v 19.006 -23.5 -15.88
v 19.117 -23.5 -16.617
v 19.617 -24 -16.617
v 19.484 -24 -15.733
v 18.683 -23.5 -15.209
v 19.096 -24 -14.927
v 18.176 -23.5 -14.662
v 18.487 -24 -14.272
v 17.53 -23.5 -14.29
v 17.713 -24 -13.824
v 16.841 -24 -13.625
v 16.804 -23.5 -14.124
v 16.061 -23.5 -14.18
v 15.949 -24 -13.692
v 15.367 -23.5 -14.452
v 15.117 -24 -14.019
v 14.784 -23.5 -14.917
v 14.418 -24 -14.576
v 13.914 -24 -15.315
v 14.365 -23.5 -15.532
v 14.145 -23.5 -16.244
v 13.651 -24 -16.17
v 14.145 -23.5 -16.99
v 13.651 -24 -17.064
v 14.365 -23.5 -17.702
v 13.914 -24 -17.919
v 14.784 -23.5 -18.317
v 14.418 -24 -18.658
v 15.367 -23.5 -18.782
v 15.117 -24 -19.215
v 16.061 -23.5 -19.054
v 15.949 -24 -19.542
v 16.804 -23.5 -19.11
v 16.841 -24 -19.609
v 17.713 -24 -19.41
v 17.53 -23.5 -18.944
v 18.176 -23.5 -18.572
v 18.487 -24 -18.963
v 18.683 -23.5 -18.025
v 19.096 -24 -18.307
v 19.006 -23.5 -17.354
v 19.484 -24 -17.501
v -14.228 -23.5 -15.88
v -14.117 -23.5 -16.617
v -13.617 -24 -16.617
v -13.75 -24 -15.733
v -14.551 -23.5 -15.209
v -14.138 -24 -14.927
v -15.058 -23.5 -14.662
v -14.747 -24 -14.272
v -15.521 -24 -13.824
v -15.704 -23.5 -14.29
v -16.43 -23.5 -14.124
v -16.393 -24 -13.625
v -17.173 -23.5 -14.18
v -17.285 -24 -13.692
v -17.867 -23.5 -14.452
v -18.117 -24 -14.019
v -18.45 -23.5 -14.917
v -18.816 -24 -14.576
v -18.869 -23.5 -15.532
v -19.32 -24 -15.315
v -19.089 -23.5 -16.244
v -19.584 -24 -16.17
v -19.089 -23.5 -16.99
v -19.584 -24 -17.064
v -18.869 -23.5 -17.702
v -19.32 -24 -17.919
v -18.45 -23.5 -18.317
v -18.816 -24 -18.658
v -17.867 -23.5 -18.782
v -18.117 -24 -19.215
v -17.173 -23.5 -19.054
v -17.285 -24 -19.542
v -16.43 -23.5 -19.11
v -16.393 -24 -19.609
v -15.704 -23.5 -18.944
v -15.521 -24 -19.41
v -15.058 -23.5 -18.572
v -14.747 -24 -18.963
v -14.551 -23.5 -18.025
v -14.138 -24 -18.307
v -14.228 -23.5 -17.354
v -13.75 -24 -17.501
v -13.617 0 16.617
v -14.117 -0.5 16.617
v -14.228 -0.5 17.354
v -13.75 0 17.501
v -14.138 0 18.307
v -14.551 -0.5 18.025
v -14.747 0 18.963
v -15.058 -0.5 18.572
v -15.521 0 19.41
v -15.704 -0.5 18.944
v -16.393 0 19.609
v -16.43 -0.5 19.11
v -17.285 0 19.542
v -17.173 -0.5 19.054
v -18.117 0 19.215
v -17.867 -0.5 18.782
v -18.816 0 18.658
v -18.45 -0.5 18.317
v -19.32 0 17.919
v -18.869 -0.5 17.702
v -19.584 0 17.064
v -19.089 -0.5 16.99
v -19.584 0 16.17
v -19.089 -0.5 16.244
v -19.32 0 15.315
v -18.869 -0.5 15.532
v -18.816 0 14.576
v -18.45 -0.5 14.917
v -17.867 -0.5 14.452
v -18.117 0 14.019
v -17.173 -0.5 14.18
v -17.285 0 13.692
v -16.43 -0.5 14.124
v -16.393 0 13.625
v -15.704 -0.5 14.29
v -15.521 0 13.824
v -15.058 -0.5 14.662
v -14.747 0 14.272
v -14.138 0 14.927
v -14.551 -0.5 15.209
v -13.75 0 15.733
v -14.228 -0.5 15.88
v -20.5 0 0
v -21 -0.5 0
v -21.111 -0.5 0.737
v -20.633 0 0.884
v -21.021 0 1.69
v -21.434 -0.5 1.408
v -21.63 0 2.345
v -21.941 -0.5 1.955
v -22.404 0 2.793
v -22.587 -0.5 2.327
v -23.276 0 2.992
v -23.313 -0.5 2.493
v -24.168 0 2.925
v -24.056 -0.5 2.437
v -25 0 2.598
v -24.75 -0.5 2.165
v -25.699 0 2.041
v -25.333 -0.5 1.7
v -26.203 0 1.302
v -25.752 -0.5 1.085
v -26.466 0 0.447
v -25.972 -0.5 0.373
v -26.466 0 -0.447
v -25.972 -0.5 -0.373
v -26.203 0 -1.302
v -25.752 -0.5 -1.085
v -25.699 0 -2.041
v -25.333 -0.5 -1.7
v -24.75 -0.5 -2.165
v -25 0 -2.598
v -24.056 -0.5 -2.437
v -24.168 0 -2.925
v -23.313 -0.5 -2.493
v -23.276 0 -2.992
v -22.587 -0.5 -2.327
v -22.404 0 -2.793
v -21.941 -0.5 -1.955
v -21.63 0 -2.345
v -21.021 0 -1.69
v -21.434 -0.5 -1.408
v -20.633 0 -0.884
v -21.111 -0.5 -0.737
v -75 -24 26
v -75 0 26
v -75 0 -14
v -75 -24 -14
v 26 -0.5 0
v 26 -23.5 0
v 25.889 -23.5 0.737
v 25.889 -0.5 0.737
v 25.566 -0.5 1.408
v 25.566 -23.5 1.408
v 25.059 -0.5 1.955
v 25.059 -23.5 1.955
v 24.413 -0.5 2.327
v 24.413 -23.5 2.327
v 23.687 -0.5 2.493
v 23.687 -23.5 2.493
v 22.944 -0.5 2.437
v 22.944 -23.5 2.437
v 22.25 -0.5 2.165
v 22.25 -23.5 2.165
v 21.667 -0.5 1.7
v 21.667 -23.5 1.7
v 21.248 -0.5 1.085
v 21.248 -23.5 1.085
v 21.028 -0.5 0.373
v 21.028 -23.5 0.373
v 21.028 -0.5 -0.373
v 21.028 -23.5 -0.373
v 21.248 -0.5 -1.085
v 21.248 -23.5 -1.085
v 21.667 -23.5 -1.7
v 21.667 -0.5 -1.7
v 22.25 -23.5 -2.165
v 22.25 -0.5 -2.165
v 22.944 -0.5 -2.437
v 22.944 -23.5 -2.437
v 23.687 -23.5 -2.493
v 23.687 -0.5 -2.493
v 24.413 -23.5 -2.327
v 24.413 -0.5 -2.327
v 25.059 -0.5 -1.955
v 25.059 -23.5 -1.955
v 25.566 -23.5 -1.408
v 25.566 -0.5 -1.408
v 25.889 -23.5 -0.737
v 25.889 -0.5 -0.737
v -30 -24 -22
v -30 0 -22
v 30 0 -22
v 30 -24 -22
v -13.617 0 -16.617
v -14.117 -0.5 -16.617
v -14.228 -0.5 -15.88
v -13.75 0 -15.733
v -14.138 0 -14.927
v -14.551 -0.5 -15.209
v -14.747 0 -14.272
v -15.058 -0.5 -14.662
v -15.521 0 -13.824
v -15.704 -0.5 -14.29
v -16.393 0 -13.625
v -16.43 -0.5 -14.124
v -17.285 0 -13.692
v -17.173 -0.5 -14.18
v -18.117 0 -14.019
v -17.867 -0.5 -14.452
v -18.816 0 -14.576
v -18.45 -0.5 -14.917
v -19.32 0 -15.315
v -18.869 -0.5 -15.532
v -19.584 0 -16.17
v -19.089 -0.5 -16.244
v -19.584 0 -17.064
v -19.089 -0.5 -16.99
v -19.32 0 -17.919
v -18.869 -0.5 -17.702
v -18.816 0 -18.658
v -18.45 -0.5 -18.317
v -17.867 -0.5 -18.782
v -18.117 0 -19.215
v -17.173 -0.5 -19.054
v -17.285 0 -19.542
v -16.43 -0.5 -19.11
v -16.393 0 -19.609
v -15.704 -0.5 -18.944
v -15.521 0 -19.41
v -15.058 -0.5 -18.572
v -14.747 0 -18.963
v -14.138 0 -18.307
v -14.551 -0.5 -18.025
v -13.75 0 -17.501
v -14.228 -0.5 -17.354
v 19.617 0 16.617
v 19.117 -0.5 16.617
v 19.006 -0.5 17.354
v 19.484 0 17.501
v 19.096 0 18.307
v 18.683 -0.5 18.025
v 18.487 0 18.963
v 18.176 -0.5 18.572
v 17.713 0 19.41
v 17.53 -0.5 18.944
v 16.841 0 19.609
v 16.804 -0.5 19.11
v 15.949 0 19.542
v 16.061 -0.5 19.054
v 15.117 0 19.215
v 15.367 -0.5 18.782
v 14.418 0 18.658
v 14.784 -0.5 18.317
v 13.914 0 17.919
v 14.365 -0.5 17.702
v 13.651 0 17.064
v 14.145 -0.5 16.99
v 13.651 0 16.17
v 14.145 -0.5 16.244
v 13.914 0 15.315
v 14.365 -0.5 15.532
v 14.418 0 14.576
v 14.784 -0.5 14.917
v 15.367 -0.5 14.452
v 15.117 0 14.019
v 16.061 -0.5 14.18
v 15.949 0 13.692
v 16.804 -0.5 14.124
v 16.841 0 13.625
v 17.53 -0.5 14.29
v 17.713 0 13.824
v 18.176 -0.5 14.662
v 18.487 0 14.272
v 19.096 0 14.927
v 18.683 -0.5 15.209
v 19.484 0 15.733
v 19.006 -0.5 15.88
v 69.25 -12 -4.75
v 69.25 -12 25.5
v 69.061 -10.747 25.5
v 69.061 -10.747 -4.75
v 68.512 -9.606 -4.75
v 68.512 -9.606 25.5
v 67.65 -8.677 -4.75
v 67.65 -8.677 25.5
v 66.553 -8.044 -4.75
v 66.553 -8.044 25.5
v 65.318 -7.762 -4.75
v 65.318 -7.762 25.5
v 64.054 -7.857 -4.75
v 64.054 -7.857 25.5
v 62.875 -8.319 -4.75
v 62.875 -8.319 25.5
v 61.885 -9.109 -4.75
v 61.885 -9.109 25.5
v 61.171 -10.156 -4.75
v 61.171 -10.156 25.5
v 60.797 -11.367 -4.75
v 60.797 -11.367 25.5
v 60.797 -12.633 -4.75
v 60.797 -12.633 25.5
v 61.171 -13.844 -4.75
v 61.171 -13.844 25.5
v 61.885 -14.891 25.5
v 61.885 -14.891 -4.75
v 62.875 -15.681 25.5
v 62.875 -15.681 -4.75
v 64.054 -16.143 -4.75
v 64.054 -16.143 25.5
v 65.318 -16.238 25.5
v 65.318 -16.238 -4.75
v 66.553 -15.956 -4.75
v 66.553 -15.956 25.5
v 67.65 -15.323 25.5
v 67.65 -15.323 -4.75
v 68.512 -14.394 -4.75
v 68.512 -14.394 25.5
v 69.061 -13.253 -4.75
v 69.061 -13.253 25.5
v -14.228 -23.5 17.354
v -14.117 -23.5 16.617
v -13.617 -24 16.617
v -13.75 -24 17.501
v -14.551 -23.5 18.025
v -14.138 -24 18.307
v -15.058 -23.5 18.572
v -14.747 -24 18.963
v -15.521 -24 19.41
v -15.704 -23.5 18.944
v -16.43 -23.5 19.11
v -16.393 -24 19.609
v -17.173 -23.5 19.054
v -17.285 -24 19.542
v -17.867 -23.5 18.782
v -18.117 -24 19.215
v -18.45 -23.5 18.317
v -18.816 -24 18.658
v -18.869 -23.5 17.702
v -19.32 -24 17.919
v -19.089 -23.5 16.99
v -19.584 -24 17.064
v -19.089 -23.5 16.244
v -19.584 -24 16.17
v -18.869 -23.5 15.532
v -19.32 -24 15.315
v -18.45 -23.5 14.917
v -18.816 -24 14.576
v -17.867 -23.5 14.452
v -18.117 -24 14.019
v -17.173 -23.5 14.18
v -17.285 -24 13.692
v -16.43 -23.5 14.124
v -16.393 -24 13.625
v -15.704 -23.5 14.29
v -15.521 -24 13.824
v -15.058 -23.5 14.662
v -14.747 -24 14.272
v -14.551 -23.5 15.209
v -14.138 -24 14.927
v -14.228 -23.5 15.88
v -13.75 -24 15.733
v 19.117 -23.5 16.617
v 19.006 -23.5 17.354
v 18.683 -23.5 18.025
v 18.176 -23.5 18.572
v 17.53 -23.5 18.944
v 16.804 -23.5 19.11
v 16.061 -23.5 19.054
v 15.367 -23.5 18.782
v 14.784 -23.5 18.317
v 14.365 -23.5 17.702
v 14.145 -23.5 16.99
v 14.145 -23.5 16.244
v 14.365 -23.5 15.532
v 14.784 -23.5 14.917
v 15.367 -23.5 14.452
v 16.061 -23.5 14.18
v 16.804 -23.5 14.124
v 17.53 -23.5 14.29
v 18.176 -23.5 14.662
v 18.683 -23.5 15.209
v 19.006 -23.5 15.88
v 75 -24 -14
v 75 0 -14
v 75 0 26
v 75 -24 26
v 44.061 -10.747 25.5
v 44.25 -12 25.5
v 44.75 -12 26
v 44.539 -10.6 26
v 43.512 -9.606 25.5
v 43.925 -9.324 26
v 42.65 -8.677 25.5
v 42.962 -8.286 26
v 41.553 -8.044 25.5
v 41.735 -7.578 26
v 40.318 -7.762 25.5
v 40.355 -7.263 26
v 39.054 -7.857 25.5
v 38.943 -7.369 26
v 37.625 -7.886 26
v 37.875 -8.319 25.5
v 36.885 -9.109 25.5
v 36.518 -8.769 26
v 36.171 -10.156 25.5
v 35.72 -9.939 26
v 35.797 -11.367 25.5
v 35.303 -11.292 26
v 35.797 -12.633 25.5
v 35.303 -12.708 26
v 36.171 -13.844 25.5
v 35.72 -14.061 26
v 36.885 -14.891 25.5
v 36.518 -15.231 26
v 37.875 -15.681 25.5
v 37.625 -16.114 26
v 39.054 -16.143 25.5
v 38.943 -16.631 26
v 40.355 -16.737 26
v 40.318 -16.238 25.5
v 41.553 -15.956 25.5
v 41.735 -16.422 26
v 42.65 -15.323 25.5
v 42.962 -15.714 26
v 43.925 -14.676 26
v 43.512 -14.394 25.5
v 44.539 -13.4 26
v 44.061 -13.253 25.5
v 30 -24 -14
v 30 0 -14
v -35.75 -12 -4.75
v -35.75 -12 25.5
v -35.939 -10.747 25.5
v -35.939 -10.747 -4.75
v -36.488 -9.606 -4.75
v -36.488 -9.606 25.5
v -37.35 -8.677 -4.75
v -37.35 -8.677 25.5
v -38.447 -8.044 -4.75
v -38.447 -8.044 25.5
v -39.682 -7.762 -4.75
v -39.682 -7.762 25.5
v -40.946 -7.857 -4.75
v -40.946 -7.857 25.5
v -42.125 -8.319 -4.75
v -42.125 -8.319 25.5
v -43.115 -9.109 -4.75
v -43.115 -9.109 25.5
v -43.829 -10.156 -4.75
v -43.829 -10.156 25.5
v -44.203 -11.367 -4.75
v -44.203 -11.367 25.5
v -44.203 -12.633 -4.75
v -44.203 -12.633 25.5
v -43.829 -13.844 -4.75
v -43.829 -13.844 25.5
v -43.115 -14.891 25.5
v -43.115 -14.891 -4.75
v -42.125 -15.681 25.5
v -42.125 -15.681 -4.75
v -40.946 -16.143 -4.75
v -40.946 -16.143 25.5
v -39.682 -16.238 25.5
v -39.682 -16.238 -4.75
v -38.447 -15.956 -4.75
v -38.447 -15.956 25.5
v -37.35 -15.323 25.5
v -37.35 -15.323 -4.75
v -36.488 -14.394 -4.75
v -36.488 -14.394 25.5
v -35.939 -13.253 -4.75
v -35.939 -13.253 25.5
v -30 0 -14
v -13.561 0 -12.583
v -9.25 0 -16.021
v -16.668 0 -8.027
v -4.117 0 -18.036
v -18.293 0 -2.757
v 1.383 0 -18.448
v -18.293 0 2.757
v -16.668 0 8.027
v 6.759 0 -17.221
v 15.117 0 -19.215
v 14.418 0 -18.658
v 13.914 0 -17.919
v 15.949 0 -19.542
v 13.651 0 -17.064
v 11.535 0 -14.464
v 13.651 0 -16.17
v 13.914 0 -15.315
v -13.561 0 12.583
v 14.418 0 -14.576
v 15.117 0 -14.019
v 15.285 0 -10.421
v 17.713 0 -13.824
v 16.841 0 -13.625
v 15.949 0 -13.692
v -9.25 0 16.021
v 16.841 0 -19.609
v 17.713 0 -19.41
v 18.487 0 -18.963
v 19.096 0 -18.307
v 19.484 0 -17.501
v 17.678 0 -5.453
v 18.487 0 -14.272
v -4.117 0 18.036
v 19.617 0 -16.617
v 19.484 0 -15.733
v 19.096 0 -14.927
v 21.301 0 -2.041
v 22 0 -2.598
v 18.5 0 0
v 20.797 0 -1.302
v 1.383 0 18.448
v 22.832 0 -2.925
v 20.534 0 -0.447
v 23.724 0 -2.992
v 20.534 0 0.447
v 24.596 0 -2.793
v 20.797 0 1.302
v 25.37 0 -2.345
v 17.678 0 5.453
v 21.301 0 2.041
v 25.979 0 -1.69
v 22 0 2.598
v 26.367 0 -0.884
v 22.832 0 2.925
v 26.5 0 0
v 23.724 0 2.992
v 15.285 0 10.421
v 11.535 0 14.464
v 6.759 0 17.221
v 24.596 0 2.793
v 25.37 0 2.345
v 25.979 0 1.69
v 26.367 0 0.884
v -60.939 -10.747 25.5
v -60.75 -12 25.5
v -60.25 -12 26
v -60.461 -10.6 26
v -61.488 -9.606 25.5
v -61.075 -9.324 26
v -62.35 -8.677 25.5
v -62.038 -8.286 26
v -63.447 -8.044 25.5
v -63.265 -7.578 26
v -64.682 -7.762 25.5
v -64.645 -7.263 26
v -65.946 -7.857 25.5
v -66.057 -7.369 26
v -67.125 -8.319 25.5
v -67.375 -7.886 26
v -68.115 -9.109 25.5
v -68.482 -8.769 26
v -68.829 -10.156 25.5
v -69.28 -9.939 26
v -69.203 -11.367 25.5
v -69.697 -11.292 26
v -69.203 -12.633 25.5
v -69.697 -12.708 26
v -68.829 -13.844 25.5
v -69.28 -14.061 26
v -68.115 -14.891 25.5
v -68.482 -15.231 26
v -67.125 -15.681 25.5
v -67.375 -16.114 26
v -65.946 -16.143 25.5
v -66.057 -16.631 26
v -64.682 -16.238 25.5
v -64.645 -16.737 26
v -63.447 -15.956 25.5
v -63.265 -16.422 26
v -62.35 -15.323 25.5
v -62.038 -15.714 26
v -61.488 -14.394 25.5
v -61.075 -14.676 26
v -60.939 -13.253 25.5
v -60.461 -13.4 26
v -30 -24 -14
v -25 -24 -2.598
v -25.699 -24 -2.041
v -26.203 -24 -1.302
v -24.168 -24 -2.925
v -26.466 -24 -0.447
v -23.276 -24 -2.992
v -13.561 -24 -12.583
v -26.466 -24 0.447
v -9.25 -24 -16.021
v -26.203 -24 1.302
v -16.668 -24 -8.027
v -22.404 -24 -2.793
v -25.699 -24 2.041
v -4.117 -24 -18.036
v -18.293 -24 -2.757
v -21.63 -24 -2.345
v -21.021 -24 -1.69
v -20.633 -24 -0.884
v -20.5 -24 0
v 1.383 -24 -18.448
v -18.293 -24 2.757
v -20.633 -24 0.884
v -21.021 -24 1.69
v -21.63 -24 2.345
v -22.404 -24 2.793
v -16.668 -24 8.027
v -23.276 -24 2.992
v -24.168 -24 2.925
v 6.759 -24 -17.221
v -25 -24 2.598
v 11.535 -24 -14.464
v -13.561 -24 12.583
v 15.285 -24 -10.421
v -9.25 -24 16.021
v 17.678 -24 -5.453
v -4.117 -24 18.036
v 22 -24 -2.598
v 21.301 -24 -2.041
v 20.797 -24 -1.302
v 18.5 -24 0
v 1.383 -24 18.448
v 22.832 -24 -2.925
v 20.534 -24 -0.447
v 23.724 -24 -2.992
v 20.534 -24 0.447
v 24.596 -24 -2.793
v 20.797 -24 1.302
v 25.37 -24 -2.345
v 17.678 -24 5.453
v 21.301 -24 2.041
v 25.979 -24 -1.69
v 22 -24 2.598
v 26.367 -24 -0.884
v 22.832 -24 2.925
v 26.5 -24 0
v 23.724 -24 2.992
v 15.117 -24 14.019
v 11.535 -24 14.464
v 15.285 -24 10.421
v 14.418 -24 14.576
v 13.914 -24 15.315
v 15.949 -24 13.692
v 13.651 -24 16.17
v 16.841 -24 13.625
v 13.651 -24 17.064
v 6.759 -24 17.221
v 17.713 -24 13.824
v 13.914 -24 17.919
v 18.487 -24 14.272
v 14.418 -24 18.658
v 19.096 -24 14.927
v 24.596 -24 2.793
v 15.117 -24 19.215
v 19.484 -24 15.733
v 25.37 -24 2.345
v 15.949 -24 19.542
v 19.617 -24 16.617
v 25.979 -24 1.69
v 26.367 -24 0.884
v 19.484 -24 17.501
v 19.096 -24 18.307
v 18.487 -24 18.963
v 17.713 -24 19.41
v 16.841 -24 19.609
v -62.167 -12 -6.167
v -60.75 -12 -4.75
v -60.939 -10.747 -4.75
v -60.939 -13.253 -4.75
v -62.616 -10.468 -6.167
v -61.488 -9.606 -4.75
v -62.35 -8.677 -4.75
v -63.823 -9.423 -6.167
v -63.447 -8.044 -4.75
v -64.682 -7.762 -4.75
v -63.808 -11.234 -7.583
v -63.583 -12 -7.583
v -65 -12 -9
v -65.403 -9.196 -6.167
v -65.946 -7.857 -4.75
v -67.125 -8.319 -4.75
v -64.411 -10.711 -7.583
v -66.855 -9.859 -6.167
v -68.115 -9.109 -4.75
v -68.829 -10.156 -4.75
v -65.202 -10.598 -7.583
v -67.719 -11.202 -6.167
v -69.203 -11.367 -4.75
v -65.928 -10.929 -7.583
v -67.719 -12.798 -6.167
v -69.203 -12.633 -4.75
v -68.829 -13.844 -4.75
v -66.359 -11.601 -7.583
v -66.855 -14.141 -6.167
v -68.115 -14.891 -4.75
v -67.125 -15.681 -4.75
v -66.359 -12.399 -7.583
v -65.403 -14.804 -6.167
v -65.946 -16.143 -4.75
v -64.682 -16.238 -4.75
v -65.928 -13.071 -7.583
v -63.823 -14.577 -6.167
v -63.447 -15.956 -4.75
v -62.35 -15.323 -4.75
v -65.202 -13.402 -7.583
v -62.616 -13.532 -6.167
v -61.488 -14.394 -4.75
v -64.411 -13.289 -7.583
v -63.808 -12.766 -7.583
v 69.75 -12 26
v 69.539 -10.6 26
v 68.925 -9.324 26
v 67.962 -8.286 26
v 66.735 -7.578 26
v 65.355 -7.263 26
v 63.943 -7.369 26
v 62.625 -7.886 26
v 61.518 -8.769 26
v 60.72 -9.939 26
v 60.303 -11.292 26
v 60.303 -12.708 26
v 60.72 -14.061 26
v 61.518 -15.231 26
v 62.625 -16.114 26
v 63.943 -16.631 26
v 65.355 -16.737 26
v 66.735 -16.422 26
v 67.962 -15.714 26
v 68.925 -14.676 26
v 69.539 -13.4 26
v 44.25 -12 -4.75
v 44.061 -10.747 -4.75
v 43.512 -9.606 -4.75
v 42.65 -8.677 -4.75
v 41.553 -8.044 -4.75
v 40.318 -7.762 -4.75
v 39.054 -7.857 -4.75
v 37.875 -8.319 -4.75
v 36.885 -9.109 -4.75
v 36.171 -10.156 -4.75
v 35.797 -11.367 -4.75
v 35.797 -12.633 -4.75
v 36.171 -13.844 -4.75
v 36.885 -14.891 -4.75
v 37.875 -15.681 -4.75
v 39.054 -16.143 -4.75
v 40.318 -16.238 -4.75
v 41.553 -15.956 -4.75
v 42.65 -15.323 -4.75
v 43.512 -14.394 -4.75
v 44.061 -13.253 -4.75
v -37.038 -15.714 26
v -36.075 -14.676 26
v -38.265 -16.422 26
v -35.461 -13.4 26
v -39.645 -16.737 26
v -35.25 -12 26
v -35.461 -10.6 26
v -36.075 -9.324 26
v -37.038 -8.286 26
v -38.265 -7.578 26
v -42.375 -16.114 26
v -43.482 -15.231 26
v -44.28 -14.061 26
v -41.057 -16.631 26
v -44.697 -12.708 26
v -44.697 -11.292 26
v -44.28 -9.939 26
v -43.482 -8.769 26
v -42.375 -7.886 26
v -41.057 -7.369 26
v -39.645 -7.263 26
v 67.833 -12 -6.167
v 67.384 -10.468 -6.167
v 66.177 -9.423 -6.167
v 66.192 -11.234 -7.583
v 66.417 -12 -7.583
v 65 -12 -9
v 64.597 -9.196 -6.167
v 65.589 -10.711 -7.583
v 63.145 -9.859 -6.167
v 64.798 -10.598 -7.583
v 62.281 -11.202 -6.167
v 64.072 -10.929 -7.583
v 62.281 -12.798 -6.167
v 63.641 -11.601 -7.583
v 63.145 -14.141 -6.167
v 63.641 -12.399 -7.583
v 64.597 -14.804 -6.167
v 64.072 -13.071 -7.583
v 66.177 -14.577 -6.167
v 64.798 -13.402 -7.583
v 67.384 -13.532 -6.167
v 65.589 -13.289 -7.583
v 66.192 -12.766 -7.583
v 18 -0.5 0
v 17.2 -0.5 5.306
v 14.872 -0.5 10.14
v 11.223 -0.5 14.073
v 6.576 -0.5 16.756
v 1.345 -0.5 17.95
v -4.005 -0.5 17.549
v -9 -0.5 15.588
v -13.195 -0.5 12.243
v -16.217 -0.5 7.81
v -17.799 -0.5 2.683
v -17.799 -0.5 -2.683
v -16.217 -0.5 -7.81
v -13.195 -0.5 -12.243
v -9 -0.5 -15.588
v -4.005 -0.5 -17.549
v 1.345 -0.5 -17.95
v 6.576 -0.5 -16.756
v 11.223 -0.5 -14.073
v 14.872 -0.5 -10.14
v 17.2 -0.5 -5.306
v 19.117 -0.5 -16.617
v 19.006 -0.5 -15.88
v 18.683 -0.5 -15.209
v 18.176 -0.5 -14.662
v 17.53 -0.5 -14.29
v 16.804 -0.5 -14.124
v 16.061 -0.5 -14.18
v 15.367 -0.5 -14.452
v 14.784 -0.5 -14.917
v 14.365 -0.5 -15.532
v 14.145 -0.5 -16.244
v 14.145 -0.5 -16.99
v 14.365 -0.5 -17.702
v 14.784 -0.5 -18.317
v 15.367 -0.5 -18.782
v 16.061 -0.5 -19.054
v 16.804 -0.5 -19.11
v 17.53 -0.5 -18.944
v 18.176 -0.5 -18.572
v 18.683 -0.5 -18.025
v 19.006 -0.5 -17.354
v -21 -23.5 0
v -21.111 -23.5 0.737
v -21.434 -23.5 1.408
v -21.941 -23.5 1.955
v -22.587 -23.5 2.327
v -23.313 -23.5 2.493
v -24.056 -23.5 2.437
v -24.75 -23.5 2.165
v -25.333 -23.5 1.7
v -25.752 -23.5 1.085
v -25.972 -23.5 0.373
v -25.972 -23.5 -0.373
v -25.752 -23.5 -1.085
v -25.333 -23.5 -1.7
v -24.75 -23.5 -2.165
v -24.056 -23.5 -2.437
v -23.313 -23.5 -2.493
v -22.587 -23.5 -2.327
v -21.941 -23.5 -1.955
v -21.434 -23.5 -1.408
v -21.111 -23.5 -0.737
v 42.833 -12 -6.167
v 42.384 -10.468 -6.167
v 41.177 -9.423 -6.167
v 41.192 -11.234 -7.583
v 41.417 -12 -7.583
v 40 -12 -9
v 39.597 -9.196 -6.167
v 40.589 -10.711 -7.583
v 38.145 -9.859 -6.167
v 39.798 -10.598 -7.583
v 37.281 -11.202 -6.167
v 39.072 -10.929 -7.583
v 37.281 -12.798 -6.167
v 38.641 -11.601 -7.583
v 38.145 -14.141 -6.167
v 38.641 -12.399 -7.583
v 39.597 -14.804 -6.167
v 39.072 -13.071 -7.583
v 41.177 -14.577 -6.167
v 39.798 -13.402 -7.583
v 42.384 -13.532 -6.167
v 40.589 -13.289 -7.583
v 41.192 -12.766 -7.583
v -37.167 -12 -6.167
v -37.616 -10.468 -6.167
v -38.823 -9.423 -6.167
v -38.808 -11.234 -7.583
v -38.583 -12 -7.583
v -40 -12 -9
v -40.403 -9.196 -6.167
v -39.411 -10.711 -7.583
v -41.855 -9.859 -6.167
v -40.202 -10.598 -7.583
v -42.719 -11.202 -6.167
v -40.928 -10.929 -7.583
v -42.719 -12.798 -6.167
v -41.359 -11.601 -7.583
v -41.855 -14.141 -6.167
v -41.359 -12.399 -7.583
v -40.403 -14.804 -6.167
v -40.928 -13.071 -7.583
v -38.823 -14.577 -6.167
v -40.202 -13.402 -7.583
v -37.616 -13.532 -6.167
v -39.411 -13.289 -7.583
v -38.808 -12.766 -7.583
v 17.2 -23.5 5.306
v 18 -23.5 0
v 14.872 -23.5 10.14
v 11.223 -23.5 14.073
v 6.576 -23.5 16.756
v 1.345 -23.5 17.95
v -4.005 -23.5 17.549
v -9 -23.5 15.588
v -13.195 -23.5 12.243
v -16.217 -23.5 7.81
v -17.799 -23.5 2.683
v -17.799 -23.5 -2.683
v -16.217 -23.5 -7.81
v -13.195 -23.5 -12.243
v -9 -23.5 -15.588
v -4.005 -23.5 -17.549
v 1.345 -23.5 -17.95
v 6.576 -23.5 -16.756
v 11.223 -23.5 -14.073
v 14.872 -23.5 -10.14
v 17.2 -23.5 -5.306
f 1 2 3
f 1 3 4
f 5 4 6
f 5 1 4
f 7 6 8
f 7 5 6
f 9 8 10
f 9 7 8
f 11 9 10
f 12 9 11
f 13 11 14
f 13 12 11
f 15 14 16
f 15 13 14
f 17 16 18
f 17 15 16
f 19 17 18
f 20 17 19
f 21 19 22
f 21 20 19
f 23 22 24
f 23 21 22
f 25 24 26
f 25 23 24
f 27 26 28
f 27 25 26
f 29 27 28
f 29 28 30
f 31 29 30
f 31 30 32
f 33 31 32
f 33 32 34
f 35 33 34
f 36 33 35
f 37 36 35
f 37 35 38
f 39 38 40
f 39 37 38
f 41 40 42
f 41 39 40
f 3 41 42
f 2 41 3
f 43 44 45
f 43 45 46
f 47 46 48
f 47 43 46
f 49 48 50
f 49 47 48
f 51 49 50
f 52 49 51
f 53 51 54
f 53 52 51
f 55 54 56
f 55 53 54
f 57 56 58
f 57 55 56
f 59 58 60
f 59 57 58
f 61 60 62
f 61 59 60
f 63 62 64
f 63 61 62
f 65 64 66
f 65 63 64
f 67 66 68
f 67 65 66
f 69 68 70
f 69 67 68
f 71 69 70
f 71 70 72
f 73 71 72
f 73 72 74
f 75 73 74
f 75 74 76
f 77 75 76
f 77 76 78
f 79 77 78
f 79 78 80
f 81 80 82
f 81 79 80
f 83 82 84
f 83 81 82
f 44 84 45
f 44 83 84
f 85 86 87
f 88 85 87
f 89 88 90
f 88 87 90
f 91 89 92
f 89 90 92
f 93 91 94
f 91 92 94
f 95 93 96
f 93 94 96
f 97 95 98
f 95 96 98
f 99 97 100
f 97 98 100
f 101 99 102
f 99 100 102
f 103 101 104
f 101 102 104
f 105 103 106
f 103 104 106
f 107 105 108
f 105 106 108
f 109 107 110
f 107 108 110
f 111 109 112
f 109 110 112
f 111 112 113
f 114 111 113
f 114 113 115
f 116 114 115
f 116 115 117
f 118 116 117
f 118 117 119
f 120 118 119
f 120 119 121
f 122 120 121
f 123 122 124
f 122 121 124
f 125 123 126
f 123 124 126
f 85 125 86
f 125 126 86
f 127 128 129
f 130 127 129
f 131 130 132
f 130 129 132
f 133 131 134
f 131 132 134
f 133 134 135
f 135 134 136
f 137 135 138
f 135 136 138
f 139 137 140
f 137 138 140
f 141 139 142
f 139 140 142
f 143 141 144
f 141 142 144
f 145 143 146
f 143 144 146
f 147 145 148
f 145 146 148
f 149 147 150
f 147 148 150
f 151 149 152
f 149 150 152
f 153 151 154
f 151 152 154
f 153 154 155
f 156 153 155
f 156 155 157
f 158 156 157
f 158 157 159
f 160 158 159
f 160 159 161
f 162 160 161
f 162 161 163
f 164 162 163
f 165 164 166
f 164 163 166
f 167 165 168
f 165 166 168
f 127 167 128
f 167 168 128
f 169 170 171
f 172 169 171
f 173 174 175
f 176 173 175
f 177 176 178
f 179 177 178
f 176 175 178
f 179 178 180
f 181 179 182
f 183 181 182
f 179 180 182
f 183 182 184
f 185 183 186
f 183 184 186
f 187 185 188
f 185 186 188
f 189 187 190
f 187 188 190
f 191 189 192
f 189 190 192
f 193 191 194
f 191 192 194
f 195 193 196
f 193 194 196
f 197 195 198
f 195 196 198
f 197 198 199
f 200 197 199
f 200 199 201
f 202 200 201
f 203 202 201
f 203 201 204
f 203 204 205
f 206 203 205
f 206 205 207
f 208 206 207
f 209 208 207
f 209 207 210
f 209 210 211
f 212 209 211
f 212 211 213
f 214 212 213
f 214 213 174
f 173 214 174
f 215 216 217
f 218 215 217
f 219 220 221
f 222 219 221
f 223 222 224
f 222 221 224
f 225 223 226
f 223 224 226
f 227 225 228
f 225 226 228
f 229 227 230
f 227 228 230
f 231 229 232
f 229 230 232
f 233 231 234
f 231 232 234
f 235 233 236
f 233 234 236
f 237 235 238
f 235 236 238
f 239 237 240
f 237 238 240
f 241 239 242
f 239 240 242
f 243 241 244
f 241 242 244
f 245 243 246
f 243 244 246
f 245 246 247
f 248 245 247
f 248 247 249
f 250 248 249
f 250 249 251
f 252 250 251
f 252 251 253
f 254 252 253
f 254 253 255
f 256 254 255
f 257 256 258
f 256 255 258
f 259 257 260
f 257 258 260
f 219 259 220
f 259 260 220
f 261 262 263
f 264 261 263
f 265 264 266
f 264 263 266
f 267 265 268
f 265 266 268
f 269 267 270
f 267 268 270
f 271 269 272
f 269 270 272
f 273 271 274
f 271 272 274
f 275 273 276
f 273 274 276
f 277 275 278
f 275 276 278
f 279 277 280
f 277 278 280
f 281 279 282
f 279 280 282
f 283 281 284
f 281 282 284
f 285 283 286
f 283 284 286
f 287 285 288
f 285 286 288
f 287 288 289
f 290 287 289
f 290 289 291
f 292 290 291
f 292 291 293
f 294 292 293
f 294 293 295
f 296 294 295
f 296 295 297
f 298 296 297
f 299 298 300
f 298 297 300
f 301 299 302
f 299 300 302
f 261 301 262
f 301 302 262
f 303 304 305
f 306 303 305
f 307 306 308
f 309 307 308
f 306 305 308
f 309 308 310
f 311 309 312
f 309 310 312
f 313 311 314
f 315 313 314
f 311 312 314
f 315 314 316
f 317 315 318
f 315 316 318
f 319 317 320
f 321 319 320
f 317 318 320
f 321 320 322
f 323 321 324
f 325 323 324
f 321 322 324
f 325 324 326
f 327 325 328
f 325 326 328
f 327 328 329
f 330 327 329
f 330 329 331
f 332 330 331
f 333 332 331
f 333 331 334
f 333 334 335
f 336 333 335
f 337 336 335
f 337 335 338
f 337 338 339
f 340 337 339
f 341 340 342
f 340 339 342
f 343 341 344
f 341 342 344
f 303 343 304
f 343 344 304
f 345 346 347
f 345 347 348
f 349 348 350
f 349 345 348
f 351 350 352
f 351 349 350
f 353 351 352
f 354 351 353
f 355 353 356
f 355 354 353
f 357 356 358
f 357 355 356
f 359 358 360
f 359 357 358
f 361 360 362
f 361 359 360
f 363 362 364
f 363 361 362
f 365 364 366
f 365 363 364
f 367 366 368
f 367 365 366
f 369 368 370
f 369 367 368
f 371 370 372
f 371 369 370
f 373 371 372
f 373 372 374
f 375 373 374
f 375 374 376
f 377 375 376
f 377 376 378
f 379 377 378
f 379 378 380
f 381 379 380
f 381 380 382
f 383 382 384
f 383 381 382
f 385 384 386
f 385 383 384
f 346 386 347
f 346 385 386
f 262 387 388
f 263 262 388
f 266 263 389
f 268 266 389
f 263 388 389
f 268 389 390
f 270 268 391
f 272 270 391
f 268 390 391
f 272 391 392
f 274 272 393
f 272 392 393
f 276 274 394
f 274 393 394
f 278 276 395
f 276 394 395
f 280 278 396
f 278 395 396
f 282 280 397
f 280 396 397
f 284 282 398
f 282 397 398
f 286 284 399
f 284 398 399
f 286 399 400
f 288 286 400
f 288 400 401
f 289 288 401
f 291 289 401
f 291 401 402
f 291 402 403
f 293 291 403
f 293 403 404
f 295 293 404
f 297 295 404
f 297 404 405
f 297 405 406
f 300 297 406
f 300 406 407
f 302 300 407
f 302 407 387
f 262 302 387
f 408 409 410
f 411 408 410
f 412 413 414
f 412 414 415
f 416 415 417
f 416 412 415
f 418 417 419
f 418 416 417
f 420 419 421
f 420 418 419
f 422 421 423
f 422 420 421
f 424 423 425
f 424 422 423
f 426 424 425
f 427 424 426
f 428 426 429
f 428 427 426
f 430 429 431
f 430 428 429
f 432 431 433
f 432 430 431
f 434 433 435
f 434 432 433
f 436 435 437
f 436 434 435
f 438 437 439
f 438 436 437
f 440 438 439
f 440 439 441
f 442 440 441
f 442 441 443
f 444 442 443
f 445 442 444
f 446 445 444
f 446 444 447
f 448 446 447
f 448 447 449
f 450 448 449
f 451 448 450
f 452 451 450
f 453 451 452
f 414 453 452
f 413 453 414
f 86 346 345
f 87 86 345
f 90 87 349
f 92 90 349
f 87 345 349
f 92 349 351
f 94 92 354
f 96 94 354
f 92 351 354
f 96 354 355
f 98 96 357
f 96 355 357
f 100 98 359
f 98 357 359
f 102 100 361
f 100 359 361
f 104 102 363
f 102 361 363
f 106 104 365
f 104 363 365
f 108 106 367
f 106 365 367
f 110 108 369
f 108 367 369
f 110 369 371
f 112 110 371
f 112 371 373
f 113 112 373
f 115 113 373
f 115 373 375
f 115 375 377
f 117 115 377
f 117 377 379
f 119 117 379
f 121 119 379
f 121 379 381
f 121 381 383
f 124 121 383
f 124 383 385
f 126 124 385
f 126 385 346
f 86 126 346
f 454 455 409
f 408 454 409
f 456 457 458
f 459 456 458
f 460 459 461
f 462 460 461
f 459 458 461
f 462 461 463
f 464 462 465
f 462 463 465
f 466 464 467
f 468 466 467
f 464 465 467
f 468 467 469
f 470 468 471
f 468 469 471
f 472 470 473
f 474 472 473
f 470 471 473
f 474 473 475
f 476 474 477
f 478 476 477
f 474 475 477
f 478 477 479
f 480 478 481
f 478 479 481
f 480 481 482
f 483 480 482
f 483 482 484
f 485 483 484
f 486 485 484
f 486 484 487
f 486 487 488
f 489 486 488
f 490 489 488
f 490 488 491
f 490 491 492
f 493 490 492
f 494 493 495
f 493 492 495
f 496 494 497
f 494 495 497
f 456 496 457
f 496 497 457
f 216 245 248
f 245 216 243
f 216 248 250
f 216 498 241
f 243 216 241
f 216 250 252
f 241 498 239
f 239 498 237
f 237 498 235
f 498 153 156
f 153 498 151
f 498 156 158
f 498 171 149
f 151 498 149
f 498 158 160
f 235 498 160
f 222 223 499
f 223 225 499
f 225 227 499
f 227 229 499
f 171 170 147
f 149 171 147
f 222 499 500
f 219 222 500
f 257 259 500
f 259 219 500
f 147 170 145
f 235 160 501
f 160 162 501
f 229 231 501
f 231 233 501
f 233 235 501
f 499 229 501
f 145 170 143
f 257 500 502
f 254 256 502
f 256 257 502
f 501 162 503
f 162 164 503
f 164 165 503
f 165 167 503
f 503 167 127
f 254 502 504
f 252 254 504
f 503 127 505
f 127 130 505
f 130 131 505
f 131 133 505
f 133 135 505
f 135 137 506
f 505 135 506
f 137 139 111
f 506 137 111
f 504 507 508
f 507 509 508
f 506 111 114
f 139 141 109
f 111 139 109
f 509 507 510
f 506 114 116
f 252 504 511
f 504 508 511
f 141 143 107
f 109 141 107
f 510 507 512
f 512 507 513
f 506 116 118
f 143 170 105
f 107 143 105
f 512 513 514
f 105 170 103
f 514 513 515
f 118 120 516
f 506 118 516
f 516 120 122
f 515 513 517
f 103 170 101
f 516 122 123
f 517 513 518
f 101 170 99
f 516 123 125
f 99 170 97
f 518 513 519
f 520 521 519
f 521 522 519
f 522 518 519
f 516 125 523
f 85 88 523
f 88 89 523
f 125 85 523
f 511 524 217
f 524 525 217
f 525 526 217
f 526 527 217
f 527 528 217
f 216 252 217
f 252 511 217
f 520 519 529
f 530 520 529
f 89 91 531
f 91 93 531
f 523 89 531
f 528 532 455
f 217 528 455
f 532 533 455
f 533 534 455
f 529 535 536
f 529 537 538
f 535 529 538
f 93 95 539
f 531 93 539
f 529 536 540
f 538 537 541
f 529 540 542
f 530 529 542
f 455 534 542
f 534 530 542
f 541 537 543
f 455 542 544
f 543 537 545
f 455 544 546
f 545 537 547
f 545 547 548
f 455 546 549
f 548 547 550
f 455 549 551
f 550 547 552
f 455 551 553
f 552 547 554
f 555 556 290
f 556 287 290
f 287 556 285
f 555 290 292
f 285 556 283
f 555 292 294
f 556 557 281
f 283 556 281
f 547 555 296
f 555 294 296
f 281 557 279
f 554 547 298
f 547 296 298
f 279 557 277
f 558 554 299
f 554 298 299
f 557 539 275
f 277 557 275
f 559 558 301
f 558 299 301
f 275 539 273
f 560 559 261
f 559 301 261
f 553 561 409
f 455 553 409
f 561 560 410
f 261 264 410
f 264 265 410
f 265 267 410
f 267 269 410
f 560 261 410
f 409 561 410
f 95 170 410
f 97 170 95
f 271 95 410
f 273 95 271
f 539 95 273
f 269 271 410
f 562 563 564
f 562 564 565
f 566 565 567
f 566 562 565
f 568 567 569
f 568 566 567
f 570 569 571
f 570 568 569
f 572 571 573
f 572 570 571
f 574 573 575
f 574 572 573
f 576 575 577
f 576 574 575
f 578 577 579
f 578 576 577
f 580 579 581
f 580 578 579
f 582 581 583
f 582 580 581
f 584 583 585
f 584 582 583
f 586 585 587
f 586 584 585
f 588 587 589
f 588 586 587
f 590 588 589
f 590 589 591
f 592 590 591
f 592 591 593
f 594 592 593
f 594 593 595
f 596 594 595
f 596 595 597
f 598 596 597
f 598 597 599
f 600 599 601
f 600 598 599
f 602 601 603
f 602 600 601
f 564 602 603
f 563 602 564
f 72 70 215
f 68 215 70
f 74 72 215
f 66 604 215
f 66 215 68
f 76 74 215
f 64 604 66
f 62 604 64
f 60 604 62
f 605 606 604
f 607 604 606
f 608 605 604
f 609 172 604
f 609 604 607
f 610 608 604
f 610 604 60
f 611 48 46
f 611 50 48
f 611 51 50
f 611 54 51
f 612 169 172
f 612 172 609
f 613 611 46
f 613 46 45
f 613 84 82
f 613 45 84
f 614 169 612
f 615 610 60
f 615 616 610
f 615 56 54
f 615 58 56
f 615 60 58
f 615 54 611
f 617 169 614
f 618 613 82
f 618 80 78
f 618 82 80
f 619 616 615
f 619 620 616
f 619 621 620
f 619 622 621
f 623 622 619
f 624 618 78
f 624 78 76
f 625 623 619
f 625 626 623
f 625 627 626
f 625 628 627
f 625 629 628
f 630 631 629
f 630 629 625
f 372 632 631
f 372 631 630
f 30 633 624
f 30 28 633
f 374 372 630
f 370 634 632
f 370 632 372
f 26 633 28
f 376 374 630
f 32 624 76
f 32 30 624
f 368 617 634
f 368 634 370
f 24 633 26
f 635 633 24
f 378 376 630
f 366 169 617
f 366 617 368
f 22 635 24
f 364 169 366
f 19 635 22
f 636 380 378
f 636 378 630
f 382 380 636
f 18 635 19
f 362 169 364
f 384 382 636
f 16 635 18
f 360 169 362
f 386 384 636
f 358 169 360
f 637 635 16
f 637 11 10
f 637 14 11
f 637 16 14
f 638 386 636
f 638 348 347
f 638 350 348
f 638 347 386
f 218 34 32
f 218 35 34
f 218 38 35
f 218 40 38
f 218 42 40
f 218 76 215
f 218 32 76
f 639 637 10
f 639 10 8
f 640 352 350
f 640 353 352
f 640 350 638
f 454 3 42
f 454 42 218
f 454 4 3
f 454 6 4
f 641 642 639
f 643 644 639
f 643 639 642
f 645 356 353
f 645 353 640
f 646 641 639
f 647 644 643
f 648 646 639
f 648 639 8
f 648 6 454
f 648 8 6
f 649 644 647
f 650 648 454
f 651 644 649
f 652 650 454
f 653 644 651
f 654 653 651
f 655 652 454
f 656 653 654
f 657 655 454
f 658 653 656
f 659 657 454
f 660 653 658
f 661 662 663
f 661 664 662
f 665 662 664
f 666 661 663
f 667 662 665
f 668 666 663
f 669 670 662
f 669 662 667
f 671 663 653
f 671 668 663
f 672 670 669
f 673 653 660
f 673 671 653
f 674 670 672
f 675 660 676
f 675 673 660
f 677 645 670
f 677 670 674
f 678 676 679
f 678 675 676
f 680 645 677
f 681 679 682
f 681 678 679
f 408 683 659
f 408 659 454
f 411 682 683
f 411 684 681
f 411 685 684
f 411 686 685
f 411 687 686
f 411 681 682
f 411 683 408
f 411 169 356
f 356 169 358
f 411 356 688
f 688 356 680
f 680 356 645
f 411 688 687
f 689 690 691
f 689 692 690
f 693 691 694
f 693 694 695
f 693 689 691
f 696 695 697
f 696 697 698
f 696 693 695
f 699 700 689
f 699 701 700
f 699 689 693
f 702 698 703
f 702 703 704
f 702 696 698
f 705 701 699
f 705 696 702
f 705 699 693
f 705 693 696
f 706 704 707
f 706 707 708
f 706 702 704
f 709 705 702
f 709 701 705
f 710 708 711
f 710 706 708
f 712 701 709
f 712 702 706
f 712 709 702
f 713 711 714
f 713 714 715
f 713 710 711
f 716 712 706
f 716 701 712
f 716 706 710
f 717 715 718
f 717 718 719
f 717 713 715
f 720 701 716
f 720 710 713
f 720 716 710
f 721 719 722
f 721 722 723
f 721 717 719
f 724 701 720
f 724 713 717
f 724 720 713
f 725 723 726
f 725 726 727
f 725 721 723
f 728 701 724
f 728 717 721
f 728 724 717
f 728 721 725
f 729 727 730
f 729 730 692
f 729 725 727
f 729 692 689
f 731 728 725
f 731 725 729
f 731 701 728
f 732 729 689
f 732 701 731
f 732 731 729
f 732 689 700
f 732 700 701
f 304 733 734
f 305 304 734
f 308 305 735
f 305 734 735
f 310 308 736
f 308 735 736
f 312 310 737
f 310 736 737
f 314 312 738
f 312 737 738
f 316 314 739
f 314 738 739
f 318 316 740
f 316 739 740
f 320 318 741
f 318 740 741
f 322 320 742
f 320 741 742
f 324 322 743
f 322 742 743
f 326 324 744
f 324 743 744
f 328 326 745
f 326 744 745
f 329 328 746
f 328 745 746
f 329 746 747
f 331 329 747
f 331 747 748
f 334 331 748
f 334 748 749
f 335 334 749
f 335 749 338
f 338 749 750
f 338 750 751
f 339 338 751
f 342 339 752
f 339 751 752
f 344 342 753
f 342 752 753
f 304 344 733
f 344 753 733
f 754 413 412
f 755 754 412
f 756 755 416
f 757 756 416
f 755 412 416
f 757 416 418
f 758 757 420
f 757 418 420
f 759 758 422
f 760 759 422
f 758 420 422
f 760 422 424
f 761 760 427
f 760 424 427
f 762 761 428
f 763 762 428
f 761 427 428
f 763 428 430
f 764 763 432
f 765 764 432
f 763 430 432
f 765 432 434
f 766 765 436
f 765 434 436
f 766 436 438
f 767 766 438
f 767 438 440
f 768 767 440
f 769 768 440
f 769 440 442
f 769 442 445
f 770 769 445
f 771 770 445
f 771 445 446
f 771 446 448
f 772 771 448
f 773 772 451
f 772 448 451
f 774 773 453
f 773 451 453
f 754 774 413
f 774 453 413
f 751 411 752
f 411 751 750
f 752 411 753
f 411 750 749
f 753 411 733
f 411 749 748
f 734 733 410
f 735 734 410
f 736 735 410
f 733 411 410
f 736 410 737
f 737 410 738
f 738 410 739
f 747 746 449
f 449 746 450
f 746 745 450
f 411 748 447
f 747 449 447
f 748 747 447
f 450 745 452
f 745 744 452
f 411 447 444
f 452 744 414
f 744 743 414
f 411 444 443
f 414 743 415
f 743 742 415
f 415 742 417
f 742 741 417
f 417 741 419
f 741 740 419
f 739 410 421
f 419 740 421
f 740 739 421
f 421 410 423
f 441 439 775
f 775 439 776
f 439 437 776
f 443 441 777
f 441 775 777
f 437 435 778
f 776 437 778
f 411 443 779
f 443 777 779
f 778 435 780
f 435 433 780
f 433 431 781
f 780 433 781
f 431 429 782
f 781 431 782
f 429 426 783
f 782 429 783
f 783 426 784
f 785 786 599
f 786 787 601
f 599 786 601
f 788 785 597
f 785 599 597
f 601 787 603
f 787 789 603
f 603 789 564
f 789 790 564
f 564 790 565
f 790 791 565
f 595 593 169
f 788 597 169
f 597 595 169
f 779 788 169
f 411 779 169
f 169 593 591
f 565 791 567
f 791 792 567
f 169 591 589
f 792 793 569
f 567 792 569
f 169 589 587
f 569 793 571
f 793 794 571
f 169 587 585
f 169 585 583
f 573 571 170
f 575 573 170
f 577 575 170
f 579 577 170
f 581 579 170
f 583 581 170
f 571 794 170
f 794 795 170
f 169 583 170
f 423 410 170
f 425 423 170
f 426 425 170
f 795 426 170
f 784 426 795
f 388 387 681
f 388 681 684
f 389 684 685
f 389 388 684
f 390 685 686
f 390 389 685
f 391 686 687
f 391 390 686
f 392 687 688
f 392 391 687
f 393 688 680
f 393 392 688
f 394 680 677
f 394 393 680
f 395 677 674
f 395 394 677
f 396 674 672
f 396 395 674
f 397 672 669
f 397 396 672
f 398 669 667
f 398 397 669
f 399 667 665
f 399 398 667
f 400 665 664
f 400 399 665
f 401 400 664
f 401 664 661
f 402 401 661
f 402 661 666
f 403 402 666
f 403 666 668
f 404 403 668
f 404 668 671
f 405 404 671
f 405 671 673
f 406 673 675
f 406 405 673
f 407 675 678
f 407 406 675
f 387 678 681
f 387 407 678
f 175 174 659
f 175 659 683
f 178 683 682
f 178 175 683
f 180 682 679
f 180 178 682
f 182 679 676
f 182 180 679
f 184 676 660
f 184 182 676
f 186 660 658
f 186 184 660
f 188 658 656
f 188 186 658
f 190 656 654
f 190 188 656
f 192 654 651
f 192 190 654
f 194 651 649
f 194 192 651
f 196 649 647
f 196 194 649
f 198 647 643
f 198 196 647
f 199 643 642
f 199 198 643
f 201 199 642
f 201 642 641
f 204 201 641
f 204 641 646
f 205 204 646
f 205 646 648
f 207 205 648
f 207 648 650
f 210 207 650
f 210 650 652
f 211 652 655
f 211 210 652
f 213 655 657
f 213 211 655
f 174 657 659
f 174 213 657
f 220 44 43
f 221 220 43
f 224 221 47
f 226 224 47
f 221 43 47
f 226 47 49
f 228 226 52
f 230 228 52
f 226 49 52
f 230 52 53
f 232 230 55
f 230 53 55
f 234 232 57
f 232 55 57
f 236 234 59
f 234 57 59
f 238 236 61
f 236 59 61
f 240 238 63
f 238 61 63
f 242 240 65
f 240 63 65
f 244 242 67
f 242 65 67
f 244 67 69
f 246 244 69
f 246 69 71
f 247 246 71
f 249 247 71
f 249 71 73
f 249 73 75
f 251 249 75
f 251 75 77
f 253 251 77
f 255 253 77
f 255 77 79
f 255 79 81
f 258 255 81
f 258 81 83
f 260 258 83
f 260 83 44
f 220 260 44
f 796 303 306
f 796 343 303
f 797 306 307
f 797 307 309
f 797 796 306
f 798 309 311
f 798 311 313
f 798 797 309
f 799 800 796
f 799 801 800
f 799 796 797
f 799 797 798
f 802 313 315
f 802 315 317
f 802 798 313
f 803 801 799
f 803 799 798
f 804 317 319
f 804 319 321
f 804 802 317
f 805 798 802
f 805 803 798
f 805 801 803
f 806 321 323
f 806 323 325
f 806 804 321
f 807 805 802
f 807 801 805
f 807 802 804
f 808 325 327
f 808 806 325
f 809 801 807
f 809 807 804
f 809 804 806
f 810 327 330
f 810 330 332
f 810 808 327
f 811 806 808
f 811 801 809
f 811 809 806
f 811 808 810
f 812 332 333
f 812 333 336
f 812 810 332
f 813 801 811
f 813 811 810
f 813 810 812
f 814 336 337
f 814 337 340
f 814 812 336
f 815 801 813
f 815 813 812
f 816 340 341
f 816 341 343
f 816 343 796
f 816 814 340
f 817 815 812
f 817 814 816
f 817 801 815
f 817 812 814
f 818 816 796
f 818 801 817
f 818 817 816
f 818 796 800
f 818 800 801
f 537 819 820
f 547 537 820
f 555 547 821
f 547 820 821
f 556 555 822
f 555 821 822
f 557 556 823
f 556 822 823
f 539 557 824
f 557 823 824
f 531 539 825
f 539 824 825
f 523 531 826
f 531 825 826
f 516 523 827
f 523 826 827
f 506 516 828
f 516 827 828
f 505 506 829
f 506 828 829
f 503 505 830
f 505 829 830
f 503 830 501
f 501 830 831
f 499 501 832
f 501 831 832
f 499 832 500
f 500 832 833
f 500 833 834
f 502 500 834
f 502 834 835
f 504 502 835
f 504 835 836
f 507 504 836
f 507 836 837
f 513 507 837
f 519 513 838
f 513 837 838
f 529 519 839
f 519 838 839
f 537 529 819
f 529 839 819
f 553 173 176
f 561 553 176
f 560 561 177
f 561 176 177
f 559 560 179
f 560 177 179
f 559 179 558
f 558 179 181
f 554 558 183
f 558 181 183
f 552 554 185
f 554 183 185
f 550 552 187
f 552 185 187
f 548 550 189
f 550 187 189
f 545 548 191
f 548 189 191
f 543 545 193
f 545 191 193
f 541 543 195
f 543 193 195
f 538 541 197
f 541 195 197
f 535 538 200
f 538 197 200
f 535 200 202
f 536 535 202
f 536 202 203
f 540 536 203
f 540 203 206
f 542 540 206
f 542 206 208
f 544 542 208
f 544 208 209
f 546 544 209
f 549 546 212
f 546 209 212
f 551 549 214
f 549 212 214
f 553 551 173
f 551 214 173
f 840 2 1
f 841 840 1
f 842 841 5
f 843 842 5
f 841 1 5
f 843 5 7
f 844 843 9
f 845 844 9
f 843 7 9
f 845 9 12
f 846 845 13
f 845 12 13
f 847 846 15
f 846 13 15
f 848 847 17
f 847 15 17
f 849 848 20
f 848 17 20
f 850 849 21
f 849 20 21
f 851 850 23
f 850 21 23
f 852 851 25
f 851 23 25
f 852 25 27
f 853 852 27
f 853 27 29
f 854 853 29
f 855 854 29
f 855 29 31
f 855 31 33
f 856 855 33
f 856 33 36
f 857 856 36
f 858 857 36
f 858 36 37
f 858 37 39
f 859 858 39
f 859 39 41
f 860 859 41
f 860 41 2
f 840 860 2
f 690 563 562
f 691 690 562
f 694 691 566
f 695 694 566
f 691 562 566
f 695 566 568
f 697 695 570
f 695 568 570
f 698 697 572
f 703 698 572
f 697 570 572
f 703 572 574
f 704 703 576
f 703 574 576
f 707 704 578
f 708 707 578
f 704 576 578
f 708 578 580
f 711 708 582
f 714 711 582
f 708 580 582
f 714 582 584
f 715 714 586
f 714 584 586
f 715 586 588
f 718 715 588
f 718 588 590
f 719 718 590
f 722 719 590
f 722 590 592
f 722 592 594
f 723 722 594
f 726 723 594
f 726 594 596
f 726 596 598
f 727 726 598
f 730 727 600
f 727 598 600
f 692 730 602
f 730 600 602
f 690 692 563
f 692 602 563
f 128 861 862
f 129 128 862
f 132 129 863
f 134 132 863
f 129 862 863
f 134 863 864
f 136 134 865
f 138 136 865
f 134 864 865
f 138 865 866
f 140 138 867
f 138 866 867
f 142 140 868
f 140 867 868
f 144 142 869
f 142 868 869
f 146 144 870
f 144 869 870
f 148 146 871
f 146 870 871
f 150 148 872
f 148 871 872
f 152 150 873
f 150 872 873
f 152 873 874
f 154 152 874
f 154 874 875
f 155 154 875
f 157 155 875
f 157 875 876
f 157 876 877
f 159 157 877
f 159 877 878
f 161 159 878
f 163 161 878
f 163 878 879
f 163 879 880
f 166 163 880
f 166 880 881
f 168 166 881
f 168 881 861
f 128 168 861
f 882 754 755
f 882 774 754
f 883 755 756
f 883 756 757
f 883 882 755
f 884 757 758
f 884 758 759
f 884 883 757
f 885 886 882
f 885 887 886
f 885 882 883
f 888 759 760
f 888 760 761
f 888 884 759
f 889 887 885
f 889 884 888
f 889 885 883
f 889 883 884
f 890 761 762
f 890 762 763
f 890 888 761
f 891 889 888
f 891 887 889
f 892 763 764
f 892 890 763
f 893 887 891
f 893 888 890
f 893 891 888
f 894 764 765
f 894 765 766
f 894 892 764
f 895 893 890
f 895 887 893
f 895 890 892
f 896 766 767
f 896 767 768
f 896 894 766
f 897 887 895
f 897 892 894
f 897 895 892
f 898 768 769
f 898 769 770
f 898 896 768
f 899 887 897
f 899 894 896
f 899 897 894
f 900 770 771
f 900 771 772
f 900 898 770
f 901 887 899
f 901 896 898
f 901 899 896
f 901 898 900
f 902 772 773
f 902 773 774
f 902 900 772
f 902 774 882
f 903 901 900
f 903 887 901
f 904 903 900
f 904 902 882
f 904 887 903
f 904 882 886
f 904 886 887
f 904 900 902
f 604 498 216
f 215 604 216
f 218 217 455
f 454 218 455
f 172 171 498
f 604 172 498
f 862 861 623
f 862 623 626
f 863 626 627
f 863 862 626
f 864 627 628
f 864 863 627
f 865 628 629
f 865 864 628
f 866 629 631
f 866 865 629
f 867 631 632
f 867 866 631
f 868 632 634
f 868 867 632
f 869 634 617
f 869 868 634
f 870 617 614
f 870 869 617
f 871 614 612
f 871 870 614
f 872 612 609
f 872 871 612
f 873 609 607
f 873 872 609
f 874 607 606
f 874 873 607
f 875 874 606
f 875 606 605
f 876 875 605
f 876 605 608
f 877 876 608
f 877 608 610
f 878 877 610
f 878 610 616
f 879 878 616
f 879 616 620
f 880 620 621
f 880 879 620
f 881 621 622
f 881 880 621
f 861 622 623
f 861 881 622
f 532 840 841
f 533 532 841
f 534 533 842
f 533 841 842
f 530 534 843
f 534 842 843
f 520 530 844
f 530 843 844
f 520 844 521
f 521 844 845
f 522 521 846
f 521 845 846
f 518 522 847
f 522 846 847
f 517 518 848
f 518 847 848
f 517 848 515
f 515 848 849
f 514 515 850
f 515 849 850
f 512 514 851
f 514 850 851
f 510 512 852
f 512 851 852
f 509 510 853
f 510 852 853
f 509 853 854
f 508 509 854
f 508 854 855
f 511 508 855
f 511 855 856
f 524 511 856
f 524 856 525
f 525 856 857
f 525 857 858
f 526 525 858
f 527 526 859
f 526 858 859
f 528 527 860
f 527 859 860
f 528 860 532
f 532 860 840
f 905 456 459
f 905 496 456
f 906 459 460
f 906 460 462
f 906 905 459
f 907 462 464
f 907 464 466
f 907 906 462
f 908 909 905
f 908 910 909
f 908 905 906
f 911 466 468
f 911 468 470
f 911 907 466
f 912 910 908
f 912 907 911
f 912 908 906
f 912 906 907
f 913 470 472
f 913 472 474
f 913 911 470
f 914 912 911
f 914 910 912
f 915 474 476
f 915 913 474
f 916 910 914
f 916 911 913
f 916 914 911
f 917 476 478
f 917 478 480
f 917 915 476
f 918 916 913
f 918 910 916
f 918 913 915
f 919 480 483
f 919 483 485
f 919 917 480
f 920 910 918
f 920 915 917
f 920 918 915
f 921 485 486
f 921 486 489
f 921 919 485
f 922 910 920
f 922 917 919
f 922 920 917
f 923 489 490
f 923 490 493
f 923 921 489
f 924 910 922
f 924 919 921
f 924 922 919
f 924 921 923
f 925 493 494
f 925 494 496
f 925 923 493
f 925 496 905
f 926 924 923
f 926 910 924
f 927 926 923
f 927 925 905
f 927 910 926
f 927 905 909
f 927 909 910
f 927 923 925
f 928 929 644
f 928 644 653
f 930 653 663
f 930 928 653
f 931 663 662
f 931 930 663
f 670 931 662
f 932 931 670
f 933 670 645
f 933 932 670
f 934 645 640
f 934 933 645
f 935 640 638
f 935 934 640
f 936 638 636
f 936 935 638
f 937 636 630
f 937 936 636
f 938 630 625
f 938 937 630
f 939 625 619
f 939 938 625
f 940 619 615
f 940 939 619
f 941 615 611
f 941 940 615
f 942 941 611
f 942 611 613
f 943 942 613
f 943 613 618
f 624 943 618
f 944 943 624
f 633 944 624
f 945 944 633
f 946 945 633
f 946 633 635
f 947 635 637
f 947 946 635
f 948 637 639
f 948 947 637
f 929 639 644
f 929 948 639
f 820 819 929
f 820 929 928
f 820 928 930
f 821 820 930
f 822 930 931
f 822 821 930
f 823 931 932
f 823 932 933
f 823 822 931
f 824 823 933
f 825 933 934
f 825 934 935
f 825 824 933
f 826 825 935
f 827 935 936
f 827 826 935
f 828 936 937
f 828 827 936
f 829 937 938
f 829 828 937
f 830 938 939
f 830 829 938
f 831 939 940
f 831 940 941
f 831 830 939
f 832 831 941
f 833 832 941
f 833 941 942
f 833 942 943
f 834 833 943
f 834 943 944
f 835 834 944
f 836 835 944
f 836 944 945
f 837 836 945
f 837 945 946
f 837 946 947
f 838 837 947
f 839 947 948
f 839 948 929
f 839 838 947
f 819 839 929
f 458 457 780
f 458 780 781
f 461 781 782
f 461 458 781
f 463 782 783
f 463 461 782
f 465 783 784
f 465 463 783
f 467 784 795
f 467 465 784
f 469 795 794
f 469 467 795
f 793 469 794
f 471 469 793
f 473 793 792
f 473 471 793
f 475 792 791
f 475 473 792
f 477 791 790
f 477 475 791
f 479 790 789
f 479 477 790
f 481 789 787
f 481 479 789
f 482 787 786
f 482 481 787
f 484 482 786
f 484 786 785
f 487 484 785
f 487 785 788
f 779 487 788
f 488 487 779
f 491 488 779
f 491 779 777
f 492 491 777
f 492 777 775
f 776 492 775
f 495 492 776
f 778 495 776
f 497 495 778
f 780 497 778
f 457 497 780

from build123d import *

# Parameters (mm, degrees)
F0_R     = 18
F1_DEPTH = 24
F2_R     = 2.5
F3_DEPTH = 25
F4_R     = 4.25
F5_DEPTH = 35
F6_SIZE  = 4.25
F7_SIZE  = 0.5


with BuildPart() as f1:
    # F0 (on Front) → F1 (new body)
    with BuildSketch(Plane.XZ):
        Polygon((-30, -22), (30, -22), (30, -14), (75, -14), (75, 26), (-75, 26), (-75, -14), (-30, -14), align=None)
        Circle(F0_R, mode=Mode.SUBTRACT)
    extrude(amount=F1_DEPTH)

    # F2 (on face) → F3 (cut)
    with BuildSketch(Plane.XZ.offset(24)):
        with Locations((-23.5, 0)):
            Circle(F2_R)
        with Locations((-16.617009, -16.617009)):
            Circle(F2_R)
        with Locations((16.617009, -16.617009)):
            Circle(F2_R)
        with Locations((23.5, 0)):
            Circle(F2_R)
        with Locations((16.617009, 16.617009)):
            Circle(F2_R)
        with Locations((-16.617009, 16.617009)):
            Circle(F2_R)
    extrude(amount=-F3_DEPTH, mode=Mode.SUBTRACT)

    # F4 (on face) → F5 (cut)
    with BuildSketch(Plane.XY.offset(26)):
        with Locations((-65, -12)):
            Circle(F4_R)
        with Locations((-40, -12)):
            Circle(F4_R)
        with Locations((65, -12)):
            Circle(F4_R)
        with Locations((40, -12)):
            Circle(F4_R)
    extrude(amount=-F5_DEPTH, mode=Mode.SUBTRACT)

    # F6
    f6_edges = [f1.edges().sort_by_distance(p)[0] for p in [
        (-69.25, -12, -9),
        (-44.25, -12, -9),
        (35.75, -12, -9),
        (60.75, -12, -9),
    ]]
    chamfer(f6_edges, length=F6_SIZE)

    # F7
    f7_edges = [f1.edges().sort_by_distance(p)[0] for p in [
        (-69.25, -12, 26),
        (-44.25, -12, 26),
        (35.75, -12, 26),
        (60.75, -12, 26),
        (18, -12, 0),
        (-18, 0, 0),
        (-18, -24, 0),
        (-26, -24, 0),
        (-21, -12, 0),
        (-26, 0, 0),
        (-19.117009, -24, 16.617009),
        (-14.117009, -12, 16.617009),
        (-19.117009, 0, 16.617009),
        (-19.117009, -24, -16.617009),
        (-14.117009, -12, -16.617009),
        (-19.117009, 0, -16.617009),
        (14.117009, -24, -16.617009),
        (19.117009, -12, -16.617009),
        (14.117009, 0, -16.617009),
        (21, -24, 0),
        (26, -12, 0),
        (21, 0, 0),
        (14.117009, -24, 16.617009),
        (19.117009, -12, 16.617009),
        (14.117009, 0, 16.617009),
    ]]
    chamfer(f7_edges, length=F7_SIZE)


solid = f1.part
